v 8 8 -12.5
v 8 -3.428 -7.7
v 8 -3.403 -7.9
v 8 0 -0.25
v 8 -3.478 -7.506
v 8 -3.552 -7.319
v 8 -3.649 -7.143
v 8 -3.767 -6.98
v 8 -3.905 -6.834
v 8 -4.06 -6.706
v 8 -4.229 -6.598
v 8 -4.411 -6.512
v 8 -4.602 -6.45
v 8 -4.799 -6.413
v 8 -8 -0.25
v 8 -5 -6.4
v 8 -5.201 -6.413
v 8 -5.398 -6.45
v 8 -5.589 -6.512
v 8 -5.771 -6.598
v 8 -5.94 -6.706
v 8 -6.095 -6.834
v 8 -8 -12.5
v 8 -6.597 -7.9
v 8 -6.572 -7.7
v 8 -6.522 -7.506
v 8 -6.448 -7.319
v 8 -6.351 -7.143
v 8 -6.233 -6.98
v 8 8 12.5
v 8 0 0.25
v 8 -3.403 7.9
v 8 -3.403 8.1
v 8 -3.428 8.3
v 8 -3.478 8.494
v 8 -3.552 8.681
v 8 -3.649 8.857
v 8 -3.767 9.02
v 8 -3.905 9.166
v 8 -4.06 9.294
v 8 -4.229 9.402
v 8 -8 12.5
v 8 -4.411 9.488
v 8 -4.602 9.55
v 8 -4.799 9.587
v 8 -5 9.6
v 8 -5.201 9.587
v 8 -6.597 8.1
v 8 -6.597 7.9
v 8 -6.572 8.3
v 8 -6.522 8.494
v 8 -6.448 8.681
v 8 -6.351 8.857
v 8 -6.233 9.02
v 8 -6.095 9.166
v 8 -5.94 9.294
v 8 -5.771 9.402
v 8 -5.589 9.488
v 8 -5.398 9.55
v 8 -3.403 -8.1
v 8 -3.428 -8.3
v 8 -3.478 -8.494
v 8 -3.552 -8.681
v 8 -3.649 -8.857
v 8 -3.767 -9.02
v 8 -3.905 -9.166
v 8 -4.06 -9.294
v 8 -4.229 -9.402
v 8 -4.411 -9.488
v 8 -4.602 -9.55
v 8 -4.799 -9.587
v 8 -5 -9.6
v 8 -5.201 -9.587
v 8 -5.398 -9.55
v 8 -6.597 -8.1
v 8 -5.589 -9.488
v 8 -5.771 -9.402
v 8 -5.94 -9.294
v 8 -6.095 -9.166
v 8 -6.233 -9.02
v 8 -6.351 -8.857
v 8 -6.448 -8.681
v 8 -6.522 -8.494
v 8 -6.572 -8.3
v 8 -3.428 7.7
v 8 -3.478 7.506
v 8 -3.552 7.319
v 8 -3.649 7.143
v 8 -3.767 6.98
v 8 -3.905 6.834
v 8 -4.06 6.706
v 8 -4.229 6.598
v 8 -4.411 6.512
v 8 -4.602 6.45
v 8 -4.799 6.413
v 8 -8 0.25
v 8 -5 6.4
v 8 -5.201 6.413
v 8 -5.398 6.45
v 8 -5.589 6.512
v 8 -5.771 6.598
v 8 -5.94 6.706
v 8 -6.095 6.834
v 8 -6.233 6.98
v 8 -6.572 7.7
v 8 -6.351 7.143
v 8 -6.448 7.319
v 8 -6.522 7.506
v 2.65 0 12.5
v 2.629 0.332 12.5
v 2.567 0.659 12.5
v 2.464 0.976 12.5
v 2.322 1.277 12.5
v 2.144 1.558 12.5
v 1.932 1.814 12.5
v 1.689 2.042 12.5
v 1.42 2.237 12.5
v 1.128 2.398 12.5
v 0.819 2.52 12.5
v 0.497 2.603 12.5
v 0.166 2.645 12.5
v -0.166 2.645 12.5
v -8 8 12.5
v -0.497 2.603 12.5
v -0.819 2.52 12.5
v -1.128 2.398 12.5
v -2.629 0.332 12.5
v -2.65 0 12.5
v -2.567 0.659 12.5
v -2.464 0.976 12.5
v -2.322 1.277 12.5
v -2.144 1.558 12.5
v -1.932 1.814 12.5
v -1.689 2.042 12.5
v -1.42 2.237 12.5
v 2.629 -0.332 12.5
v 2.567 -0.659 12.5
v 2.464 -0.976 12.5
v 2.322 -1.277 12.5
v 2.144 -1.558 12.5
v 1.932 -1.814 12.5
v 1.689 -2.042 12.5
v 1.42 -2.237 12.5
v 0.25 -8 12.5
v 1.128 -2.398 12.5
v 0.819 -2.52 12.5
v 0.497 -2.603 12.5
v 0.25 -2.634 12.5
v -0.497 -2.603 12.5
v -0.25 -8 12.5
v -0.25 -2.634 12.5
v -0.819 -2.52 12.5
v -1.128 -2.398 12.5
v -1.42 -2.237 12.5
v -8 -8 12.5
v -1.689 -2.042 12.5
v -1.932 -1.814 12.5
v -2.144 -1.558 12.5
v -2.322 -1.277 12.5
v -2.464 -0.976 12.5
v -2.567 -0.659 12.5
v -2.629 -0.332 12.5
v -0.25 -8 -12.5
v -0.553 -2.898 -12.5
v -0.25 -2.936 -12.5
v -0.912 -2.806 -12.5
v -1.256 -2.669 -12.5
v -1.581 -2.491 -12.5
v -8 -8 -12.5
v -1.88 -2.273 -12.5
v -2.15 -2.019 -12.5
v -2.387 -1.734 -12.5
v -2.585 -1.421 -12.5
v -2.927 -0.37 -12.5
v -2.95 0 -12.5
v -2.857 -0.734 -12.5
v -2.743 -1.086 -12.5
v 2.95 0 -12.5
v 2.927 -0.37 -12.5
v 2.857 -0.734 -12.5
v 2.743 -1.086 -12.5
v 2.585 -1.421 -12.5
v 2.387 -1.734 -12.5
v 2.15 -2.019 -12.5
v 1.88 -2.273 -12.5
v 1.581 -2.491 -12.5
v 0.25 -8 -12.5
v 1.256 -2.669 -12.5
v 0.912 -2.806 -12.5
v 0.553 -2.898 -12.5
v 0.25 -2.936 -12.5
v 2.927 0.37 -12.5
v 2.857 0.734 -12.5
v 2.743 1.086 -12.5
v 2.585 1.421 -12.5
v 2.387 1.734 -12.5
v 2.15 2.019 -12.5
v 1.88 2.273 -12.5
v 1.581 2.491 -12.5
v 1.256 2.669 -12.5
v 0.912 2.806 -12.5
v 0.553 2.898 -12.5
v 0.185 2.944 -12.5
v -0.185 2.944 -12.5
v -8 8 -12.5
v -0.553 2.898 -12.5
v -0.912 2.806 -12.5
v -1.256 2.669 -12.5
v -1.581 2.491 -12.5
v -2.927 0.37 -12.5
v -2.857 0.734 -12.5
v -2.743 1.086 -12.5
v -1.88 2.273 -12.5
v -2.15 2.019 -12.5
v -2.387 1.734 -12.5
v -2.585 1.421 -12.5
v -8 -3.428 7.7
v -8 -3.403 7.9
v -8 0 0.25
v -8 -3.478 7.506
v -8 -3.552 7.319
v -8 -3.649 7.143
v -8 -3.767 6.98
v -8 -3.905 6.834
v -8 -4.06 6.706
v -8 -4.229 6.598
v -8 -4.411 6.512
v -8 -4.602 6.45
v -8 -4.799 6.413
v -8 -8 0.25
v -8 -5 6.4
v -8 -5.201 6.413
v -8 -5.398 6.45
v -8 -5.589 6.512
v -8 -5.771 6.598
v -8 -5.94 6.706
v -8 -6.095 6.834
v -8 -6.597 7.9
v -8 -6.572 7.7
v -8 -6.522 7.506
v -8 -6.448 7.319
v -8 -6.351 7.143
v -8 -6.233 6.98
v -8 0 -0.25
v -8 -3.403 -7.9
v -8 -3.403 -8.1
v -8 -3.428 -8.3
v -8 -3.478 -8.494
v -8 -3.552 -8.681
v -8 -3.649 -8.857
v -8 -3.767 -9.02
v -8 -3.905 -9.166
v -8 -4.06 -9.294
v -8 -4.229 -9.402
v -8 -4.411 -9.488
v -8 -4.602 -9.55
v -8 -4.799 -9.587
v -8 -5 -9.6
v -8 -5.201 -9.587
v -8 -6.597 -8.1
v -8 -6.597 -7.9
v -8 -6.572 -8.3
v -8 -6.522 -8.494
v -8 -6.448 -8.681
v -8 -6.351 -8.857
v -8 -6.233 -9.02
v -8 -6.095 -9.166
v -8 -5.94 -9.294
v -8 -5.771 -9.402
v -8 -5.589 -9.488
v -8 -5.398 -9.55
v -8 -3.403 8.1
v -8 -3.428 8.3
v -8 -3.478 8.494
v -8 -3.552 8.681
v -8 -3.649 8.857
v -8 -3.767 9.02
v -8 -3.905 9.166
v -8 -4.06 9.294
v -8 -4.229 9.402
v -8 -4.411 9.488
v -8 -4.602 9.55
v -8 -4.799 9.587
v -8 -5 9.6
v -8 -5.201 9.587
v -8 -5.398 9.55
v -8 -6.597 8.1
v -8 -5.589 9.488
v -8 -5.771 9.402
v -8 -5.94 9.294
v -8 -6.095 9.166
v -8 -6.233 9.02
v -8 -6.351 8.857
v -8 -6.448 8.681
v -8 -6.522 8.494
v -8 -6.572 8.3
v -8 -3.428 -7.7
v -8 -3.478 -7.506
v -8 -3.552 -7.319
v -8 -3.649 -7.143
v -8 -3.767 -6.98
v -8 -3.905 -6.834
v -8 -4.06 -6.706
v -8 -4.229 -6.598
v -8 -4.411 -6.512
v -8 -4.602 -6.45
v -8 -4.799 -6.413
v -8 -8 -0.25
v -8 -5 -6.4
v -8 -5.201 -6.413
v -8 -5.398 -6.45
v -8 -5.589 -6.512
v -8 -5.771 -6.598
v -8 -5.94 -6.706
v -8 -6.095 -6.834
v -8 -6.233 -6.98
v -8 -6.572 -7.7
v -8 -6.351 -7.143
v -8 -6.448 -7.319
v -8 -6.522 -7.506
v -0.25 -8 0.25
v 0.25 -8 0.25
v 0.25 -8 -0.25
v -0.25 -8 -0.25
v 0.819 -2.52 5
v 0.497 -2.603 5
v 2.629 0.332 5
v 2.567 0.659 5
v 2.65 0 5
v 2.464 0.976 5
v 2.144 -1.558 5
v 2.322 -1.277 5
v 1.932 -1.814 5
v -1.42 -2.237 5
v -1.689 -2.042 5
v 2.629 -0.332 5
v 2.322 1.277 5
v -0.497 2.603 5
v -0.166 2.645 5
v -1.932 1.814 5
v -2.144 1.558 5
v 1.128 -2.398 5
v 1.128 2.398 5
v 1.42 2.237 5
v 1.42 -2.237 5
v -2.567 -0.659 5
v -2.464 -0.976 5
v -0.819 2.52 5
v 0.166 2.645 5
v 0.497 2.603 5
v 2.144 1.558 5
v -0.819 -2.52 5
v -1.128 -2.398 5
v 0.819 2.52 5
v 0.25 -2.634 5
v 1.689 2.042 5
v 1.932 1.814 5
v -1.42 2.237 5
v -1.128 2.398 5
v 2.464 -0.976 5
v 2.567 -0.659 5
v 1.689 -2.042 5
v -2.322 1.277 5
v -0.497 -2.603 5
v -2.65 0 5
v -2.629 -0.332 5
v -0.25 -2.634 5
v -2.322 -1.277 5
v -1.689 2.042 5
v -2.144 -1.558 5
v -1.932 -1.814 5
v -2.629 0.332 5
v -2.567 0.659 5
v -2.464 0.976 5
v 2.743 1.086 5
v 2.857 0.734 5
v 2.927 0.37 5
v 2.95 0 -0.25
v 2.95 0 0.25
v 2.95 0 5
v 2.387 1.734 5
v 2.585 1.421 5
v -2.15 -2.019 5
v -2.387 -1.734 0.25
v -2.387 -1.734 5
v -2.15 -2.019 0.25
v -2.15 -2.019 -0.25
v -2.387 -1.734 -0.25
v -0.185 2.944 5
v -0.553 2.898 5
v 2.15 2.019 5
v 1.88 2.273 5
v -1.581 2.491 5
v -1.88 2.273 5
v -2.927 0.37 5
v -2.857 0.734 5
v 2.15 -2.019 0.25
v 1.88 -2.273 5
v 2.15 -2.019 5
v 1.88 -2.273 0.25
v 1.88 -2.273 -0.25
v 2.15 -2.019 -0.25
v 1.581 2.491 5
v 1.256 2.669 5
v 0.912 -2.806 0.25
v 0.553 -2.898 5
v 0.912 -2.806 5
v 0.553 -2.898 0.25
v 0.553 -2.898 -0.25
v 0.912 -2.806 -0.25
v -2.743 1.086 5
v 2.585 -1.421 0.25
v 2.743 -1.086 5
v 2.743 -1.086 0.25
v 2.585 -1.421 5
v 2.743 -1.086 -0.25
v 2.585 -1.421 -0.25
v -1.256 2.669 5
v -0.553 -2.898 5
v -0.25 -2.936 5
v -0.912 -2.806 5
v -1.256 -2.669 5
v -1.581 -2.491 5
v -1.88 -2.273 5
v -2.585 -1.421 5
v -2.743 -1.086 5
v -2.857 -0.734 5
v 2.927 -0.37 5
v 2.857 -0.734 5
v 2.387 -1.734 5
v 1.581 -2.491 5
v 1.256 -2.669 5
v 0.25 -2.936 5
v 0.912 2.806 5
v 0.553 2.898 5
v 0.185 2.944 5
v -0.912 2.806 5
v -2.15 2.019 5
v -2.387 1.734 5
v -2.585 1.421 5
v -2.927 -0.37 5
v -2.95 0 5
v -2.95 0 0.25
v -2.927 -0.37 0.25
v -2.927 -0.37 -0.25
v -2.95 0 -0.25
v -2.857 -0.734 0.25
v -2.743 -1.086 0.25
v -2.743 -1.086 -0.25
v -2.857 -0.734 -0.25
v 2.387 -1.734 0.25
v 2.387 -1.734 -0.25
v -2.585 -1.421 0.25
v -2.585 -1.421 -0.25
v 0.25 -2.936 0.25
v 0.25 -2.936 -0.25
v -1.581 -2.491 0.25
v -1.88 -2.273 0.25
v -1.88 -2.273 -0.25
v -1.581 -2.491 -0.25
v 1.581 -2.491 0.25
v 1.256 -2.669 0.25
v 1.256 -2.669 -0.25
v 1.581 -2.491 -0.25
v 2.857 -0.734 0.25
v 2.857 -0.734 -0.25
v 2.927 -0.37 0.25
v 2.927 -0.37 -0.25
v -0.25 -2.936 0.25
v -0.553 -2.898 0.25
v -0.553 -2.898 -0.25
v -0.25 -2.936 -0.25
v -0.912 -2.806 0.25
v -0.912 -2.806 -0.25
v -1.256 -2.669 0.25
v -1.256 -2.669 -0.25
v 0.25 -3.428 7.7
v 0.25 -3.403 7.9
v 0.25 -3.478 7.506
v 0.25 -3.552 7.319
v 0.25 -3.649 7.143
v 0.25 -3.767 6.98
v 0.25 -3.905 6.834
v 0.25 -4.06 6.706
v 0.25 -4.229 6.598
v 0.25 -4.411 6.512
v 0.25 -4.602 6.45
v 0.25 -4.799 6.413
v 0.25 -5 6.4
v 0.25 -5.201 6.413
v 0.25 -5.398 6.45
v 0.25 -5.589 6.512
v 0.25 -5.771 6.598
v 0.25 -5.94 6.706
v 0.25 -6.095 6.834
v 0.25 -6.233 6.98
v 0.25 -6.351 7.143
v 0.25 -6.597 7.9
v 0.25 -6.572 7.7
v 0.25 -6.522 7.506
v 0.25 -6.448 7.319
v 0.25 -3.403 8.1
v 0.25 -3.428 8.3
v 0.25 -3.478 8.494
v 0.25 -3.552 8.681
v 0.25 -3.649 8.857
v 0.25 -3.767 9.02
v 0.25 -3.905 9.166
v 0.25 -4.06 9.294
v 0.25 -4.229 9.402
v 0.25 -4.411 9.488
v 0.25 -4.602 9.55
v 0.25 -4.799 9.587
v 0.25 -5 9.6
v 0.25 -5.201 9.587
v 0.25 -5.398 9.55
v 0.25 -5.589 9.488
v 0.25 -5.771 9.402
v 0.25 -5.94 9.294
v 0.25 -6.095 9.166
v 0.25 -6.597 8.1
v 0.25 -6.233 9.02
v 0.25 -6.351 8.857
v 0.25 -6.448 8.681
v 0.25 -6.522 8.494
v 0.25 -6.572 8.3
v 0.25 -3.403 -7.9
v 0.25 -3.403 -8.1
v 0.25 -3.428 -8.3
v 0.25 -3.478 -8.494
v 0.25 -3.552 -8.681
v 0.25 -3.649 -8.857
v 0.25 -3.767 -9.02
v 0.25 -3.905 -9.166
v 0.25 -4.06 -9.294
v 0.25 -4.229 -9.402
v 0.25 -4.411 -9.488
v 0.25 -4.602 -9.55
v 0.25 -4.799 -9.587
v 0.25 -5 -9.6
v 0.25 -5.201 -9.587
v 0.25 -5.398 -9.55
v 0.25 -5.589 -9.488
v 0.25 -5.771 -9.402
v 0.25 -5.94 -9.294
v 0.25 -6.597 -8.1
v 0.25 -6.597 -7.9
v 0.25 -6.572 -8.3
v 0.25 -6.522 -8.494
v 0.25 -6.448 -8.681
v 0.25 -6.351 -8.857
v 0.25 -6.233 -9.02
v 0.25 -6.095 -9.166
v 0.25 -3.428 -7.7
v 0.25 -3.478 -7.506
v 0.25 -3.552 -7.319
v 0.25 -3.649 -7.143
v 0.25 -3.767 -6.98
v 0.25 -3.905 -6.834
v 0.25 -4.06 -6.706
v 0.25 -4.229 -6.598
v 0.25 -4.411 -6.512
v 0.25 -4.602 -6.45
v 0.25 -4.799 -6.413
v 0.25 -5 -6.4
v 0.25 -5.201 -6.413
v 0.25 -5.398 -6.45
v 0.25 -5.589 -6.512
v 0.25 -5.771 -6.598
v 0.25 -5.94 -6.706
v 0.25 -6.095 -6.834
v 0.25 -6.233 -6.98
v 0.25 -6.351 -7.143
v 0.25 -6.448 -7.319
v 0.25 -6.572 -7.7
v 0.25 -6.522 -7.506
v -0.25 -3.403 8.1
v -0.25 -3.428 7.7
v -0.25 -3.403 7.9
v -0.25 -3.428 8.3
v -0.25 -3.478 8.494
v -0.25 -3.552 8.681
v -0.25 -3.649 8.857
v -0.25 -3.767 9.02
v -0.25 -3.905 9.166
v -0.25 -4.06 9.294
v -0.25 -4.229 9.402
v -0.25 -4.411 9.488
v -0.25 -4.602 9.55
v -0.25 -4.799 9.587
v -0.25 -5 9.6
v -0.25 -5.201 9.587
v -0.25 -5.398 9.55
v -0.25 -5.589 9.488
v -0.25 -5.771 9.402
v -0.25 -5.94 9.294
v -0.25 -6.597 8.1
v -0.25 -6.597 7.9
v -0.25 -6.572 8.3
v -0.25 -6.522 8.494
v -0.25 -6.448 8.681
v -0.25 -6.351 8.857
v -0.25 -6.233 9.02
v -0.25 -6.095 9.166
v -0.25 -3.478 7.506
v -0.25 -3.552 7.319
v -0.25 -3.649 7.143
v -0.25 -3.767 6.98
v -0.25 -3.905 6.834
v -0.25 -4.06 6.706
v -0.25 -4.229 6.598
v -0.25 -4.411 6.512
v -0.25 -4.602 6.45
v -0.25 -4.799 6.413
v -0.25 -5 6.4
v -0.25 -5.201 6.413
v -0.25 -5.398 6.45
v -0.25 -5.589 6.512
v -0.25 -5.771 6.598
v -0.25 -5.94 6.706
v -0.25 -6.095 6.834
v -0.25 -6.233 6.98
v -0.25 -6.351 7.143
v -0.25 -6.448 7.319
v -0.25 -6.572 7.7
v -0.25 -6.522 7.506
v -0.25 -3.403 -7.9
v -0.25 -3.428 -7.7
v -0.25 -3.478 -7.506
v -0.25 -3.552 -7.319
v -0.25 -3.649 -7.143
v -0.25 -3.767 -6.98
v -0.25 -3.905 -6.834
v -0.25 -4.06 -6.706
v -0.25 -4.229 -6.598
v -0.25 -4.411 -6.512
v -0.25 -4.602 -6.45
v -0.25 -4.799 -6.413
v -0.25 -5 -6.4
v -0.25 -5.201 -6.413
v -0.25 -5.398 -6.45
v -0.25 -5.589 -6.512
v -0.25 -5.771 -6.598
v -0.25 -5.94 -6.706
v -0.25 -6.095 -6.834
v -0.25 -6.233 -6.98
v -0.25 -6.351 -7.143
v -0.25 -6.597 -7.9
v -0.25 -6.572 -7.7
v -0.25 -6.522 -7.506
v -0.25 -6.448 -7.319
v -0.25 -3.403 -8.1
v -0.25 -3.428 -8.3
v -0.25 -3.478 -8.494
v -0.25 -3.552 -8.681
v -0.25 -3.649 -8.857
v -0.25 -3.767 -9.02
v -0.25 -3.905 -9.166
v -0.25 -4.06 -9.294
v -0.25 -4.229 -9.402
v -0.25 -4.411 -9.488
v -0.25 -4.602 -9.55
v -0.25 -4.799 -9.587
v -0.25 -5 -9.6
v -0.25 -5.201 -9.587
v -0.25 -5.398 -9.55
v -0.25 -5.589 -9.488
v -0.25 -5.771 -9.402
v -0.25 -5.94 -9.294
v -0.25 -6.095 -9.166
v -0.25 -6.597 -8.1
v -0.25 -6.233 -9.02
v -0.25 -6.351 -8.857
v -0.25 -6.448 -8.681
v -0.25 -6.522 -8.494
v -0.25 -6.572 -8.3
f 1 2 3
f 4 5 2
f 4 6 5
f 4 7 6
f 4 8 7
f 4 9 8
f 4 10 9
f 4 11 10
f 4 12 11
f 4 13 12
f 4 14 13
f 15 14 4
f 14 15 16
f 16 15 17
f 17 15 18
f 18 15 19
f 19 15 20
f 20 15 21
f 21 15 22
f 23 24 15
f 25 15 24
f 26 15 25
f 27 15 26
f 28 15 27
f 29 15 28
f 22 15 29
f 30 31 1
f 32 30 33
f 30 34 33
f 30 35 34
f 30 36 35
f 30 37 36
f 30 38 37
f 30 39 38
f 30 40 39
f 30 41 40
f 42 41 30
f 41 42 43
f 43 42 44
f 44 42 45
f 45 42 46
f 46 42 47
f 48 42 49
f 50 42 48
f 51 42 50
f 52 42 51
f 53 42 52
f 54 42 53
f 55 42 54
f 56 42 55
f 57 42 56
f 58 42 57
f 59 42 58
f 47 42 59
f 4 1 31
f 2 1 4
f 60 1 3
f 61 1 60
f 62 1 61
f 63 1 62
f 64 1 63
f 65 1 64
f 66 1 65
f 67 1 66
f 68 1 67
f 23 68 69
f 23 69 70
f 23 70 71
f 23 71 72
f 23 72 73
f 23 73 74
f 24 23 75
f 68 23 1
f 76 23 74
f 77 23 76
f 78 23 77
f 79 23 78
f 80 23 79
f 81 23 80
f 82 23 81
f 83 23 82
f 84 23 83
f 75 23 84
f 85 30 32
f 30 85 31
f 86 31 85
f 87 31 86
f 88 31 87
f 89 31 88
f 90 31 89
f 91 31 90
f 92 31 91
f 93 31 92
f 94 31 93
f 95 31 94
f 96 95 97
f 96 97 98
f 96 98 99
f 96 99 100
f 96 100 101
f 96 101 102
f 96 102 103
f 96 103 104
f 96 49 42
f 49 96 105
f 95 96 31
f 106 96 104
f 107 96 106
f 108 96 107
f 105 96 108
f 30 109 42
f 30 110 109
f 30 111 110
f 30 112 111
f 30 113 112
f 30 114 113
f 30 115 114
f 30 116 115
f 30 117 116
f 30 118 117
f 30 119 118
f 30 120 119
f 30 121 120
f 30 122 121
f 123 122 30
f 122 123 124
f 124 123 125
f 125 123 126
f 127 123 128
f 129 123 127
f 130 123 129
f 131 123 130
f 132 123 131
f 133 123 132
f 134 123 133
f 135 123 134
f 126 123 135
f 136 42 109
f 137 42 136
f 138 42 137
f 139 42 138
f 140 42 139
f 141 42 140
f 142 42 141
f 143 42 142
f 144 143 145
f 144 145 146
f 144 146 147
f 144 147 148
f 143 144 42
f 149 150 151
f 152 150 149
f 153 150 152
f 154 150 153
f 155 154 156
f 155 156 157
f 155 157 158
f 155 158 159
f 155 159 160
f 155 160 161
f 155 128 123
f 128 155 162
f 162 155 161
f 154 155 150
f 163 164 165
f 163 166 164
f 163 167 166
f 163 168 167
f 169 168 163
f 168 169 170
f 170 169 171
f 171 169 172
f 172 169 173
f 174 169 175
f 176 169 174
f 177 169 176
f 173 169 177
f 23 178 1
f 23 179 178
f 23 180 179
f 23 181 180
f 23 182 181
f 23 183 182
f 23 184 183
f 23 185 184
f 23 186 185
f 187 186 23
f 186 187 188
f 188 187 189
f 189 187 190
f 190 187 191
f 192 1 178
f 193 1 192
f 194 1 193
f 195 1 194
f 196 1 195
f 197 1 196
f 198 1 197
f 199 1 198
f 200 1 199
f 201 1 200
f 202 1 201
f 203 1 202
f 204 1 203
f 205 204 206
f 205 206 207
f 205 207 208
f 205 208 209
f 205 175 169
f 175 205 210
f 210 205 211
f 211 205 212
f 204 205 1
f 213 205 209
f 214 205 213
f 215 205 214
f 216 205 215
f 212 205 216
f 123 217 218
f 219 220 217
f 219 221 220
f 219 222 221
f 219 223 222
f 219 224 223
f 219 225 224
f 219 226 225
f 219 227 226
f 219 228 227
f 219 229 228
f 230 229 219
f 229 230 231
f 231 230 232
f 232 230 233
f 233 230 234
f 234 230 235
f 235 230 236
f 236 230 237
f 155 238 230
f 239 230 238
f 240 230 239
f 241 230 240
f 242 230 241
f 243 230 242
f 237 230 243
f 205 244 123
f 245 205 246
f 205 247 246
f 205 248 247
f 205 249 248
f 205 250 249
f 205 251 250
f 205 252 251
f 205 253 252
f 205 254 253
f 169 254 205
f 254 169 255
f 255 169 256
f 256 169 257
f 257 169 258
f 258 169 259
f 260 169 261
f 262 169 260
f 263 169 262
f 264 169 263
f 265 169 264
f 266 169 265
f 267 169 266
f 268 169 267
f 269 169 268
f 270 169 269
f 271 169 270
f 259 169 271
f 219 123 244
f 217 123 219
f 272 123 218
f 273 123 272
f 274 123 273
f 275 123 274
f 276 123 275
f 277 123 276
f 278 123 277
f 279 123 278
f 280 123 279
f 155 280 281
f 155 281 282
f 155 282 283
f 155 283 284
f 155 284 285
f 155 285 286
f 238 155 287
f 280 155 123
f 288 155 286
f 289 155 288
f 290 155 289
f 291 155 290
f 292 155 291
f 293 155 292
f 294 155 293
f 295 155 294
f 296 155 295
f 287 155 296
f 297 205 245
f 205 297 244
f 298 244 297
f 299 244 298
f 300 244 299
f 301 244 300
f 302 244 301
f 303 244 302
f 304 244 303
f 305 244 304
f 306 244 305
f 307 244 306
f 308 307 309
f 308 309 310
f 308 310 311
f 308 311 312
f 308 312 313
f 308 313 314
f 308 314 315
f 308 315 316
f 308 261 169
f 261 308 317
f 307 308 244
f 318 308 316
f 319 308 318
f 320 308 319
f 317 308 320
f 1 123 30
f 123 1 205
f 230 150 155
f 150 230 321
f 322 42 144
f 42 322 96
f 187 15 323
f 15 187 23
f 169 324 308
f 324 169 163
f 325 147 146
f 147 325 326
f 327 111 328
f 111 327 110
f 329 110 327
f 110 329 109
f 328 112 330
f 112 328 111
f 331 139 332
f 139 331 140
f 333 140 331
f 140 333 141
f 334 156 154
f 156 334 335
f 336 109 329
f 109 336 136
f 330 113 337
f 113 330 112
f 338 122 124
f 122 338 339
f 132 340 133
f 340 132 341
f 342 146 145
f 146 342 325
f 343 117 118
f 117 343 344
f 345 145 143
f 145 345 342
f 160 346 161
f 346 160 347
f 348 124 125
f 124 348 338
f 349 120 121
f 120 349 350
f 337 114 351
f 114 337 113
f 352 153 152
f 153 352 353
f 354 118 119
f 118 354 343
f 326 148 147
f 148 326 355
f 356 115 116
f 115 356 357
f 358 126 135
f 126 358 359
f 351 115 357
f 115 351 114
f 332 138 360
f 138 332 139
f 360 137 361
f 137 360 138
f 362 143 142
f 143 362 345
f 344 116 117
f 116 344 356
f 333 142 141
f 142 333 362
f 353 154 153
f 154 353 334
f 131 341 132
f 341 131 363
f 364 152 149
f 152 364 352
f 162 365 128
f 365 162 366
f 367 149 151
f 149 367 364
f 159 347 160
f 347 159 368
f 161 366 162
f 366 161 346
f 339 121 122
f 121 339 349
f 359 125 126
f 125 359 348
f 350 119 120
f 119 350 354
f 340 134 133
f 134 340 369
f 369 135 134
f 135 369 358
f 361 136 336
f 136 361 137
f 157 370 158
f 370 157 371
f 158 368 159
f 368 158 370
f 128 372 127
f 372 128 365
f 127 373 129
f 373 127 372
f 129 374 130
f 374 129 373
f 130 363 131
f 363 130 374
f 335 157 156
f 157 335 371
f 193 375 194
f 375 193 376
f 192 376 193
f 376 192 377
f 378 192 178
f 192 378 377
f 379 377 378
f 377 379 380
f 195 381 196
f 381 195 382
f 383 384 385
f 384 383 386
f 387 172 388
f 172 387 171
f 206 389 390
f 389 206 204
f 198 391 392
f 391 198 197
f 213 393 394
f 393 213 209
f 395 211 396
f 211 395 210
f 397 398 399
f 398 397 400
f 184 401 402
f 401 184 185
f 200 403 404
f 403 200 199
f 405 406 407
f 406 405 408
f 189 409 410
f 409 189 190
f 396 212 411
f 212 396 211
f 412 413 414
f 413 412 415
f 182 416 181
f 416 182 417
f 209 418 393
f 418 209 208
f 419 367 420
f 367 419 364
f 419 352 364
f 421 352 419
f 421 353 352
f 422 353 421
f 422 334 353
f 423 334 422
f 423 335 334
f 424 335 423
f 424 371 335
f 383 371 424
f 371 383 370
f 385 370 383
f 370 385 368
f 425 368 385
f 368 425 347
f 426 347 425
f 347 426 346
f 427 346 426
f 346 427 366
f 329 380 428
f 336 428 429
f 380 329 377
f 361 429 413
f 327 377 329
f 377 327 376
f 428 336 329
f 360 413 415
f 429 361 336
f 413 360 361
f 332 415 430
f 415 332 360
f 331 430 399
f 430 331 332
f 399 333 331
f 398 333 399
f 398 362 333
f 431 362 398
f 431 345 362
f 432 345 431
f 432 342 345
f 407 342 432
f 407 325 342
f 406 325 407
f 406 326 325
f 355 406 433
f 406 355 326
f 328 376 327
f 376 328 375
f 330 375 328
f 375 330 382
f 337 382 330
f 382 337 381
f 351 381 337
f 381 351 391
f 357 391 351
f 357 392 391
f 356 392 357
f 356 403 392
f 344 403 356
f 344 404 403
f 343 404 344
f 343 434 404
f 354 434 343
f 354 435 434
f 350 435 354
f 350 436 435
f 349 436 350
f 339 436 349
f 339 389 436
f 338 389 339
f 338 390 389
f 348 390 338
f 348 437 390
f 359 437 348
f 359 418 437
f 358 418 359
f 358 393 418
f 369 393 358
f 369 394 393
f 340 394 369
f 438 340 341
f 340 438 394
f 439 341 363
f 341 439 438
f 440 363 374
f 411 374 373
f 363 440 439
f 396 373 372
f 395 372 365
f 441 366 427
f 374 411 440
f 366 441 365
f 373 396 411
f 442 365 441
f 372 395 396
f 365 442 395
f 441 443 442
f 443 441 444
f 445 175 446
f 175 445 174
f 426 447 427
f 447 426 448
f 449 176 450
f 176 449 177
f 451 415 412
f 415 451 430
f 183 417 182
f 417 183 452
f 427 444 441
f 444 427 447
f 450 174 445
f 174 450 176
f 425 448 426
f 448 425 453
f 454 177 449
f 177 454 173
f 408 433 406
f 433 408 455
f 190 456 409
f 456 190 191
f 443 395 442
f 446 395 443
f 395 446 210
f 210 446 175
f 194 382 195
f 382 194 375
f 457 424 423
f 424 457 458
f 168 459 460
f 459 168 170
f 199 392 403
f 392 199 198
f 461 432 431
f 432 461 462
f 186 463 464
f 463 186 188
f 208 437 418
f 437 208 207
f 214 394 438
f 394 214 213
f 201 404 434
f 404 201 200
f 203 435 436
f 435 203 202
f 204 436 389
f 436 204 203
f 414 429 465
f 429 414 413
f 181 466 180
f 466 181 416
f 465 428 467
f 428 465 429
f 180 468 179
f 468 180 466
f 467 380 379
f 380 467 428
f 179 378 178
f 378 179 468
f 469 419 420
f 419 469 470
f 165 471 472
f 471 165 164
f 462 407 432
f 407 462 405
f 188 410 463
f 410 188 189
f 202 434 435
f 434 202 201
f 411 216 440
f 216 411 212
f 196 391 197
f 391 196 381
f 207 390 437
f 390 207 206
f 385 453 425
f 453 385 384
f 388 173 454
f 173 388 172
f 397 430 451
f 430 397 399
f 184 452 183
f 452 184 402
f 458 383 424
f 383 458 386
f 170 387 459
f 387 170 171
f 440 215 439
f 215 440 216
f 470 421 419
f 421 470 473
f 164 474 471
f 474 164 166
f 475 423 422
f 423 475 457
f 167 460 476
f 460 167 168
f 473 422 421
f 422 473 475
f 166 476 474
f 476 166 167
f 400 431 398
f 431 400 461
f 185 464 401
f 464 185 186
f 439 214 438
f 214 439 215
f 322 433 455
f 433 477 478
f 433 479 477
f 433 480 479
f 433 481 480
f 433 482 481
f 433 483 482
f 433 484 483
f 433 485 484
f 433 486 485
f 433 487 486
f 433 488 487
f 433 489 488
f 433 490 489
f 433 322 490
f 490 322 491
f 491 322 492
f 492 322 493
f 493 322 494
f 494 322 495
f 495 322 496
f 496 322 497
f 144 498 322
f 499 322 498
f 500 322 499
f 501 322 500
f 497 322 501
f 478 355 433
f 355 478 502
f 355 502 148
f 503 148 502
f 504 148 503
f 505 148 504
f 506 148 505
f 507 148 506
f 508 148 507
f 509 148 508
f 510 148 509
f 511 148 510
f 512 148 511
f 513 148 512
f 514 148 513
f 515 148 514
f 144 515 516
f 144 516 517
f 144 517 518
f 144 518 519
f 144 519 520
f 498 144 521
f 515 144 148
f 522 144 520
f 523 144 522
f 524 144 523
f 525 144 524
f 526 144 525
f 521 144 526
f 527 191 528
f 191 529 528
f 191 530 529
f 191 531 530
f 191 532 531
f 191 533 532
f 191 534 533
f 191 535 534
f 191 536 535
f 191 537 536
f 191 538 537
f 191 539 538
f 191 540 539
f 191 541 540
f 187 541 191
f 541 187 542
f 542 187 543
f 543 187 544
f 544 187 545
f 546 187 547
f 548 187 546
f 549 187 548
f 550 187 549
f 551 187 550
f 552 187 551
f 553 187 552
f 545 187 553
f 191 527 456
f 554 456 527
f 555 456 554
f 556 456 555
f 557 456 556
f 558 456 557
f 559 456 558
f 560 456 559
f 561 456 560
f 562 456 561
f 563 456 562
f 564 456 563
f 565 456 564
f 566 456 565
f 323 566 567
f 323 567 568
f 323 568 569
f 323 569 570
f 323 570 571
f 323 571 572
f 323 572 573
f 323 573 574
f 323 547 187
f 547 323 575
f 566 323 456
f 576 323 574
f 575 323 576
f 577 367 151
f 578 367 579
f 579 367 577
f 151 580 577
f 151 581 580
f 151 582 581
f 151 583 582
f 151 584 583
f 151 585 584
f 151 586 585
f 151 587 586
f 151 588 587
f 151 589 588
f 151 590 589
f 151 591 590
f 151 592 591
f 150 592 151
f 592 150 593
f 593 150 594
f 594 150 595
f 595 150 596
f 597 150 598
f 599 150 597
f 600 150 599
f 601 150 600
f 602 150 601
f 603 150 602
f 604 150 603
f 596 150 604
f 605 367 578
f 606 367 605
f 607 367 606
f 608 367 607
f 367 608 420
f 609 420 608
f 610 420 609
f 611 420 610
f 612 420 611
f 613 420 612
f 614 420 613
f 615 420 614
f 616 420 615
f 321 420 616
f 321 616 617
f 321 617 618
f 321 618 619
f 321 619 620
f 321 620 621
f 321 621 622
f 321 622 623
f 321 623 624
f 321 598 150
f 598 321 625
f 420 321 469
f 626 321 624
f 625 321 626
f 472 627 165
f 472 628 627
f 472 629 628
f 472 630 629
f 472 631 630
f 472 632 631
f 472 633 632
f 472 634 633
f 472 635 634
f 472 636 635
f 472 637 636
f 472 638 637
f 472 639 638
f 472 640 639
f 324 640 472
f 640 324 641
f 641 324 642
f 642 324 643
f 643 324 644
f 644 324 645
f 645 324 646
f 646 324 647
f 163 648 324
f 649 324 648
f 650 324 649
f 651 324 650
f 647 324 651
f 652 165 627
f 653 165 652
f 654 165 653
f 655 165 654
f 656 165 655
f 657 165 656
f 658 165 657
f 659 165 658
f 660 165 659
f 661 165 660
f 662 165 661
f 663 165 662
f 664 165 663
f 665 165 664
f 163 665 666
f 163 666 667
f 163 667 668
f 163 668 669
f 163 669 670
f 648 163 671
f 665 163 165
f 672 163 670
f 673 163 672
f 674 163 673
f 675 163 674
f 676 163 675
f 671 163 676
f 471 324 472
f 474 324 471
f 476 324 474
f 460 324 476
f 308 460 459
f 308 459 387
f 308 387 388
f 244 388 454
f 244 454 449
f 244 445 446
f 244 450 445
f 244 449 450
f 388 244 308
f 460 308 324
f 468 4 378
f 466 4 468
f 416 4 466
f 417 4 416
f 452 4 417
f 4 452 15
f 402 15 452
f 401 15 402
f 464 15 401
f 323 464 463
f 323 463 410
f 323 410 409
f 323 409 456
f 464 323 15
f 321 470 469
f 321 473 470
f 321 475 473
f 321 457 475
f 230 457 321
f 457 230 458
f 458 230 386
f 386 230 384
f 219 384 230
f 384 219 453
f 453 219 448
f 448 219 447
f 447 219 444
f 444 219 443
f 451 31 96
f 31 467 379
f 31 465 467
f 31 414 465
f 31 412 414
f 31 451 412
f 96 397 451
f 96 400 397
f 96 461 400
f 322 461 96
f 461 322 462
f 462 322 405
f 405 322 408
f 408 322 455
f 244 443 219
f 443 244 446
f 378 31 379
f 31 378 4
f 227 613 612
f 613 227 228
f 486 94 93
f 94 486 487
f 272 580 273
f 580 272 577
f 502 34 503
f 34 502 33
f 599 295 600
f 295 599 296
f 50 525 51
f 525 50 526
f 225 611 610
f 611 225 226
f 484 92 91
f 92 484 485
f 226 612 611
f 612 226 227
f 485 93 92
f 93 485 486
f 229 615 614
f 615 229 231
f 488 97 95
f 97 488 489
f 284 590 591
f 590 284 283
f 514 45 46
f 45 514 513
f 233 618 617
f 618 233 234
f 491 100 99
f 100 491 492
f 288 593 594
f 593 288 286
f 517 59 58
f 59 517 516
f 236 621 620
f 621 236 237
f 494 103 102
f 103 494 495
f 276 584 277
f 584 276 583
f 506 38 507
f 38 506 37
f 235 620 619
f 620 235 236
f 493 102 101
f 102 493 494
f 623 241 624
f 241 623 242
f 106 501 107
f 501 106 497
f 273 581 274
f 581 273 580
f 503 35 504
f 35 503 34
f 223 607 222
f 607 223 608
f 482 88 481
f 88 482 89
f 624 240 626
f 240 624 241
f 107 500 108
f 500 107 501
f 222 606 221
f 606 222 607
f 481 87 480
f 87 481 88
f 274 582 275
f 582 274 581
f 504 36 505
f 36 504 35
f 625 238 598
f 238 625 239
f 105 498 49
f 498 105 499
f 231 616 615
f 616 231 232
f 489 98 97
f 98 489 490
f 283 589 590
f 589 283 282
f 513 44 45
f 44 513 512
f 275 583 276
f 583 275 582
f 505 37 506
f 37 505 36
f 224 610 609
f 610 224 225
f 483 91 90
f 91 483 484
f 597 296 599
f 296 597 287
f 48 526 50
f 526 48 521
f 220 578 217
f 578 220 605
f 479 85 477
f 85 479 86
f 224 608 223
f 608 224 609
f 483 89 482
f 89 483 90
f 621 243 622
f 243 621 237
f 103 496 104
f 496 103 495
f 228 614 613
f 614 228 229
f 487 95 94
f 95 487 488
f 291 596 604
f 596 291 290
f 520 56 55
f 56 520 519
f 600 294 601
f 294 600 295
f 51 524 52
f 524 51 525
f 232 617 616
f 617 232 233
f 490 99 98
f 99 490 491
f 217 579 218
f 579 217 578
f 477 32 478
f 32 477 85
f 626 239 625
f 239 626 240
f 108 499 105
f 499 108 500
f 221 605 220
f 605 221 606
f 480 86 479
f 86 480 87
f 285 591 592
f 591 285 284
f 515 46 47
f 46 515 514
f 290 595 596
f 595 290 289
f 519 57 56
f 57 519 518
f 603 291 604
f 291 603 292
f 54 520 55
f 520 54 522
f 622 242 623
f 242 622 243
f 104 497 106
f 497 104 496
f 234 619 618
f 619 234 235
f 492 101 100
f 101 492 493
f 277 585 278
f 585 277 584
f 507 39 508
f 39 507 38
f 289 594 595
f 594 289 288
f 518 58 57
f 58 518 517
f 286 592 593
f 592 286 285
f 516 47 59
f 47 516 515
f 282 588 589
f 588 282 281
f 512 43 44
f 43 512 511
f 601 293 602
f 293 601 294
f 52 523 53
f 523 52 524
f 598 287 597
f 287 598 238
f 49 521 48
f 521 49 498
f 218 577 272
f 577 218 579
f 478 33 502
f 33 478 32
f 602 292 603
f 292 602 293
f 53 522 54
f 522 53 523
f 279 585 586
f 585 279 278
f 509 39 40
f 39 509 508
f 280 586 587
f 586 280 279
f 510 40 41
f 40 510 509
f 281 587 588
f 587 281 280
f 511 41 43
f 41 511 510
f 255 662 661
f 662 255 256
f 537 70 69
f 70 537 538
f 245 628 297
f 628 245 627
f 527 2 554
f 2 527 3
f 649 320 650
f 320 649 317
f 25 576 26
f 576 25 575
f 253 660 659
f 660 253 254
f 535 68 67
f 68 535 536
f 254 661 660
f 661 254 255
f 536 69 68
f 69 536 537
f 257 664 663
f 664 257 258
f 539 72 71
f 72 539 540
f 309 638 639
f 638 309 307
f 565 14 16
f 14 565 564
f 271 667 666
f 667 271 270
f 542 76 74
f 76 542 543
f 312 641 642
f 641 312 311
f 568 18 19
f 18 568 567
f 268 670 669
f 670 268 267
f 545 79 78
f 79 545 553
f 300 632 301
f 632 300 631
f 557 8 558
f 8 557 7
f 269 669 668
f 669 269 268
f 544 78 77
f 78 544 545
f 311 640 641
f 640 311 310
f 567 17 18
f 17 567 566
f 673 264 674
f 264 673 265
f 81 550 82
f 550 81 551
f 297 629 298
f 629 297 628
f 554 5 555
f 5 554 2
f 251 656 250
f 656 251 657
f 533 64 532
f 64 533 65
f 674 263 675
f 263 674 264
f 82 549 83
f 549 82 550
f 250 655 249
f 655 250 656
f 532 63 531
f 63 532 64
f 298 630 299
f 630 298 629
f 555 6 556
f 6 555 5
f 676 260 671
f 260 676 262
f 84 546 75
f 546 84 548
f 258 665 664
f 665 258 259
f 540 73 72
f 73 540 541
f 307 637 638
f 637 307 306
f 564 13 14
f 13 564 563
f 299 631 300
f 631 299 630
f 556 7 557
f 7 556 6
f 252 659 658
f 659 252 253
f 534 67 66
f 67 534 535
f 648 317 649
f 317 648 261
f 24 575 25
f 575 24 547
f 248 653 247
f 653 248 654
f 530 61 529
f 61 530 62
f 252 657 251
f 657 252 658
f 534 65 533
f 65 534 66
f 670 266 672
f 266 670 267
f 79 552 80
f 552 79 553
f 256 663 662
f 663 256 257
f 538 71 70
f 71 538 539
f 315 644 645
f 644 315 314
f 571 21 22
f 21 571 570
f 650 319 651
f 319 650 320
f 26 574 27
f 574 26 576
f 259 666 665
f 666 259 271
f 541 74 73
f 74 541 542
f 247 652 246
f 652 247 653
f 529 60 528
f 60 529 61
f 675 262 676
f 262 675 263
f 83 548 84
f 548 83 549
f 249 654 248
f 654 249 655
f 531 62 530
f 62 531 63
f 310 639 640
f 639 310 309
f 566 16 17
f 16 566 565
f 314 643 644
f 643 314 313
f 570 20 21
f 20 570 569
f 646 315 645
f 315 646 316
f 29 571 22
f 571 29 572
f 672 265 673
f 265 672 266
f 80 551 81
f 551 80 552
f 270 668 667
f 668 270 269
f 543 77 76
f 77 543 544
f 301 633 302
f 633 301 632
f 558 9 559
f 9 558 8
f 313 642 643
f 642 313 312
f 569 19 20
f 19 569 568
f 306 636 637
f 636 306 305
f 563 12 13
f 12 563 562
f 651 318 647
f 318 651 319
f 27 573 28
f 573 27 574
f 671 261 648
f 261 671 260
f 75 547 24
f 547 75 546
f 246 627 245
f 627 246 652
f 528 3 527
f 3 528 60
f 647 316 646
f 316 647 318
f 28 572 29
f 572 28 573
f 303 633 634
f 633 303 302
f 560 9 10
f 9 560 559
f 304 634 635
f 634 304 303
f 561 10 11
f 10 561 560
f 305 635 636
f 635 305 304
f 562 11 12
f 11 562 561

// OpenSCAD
difference(){
cube([16,16,25],center=true);
translate([0,0,25/2]) cylinder(r=5.3/2,h=25,center=true,$fn=50);
translate([0,0,-25/2]) cylinder(r=5.9/2,h=35,center=true,$fn=50);
translate([0,-8,0]) cube([0.5,16,30],center=true);    
rotate([0,90,0]) translate([0,-8,0]) cube([0.5,16,30],center=true);       
translate([0,-5,8]) rotate([0,90,0]) cylinder(r=3.2/2,h=35,center=true,$fn=50);
translate([0,-5,-8]) rotate([0,90,0]) cylinder(r=3.2/2,h=35,center=true,$fn=50);    
}
